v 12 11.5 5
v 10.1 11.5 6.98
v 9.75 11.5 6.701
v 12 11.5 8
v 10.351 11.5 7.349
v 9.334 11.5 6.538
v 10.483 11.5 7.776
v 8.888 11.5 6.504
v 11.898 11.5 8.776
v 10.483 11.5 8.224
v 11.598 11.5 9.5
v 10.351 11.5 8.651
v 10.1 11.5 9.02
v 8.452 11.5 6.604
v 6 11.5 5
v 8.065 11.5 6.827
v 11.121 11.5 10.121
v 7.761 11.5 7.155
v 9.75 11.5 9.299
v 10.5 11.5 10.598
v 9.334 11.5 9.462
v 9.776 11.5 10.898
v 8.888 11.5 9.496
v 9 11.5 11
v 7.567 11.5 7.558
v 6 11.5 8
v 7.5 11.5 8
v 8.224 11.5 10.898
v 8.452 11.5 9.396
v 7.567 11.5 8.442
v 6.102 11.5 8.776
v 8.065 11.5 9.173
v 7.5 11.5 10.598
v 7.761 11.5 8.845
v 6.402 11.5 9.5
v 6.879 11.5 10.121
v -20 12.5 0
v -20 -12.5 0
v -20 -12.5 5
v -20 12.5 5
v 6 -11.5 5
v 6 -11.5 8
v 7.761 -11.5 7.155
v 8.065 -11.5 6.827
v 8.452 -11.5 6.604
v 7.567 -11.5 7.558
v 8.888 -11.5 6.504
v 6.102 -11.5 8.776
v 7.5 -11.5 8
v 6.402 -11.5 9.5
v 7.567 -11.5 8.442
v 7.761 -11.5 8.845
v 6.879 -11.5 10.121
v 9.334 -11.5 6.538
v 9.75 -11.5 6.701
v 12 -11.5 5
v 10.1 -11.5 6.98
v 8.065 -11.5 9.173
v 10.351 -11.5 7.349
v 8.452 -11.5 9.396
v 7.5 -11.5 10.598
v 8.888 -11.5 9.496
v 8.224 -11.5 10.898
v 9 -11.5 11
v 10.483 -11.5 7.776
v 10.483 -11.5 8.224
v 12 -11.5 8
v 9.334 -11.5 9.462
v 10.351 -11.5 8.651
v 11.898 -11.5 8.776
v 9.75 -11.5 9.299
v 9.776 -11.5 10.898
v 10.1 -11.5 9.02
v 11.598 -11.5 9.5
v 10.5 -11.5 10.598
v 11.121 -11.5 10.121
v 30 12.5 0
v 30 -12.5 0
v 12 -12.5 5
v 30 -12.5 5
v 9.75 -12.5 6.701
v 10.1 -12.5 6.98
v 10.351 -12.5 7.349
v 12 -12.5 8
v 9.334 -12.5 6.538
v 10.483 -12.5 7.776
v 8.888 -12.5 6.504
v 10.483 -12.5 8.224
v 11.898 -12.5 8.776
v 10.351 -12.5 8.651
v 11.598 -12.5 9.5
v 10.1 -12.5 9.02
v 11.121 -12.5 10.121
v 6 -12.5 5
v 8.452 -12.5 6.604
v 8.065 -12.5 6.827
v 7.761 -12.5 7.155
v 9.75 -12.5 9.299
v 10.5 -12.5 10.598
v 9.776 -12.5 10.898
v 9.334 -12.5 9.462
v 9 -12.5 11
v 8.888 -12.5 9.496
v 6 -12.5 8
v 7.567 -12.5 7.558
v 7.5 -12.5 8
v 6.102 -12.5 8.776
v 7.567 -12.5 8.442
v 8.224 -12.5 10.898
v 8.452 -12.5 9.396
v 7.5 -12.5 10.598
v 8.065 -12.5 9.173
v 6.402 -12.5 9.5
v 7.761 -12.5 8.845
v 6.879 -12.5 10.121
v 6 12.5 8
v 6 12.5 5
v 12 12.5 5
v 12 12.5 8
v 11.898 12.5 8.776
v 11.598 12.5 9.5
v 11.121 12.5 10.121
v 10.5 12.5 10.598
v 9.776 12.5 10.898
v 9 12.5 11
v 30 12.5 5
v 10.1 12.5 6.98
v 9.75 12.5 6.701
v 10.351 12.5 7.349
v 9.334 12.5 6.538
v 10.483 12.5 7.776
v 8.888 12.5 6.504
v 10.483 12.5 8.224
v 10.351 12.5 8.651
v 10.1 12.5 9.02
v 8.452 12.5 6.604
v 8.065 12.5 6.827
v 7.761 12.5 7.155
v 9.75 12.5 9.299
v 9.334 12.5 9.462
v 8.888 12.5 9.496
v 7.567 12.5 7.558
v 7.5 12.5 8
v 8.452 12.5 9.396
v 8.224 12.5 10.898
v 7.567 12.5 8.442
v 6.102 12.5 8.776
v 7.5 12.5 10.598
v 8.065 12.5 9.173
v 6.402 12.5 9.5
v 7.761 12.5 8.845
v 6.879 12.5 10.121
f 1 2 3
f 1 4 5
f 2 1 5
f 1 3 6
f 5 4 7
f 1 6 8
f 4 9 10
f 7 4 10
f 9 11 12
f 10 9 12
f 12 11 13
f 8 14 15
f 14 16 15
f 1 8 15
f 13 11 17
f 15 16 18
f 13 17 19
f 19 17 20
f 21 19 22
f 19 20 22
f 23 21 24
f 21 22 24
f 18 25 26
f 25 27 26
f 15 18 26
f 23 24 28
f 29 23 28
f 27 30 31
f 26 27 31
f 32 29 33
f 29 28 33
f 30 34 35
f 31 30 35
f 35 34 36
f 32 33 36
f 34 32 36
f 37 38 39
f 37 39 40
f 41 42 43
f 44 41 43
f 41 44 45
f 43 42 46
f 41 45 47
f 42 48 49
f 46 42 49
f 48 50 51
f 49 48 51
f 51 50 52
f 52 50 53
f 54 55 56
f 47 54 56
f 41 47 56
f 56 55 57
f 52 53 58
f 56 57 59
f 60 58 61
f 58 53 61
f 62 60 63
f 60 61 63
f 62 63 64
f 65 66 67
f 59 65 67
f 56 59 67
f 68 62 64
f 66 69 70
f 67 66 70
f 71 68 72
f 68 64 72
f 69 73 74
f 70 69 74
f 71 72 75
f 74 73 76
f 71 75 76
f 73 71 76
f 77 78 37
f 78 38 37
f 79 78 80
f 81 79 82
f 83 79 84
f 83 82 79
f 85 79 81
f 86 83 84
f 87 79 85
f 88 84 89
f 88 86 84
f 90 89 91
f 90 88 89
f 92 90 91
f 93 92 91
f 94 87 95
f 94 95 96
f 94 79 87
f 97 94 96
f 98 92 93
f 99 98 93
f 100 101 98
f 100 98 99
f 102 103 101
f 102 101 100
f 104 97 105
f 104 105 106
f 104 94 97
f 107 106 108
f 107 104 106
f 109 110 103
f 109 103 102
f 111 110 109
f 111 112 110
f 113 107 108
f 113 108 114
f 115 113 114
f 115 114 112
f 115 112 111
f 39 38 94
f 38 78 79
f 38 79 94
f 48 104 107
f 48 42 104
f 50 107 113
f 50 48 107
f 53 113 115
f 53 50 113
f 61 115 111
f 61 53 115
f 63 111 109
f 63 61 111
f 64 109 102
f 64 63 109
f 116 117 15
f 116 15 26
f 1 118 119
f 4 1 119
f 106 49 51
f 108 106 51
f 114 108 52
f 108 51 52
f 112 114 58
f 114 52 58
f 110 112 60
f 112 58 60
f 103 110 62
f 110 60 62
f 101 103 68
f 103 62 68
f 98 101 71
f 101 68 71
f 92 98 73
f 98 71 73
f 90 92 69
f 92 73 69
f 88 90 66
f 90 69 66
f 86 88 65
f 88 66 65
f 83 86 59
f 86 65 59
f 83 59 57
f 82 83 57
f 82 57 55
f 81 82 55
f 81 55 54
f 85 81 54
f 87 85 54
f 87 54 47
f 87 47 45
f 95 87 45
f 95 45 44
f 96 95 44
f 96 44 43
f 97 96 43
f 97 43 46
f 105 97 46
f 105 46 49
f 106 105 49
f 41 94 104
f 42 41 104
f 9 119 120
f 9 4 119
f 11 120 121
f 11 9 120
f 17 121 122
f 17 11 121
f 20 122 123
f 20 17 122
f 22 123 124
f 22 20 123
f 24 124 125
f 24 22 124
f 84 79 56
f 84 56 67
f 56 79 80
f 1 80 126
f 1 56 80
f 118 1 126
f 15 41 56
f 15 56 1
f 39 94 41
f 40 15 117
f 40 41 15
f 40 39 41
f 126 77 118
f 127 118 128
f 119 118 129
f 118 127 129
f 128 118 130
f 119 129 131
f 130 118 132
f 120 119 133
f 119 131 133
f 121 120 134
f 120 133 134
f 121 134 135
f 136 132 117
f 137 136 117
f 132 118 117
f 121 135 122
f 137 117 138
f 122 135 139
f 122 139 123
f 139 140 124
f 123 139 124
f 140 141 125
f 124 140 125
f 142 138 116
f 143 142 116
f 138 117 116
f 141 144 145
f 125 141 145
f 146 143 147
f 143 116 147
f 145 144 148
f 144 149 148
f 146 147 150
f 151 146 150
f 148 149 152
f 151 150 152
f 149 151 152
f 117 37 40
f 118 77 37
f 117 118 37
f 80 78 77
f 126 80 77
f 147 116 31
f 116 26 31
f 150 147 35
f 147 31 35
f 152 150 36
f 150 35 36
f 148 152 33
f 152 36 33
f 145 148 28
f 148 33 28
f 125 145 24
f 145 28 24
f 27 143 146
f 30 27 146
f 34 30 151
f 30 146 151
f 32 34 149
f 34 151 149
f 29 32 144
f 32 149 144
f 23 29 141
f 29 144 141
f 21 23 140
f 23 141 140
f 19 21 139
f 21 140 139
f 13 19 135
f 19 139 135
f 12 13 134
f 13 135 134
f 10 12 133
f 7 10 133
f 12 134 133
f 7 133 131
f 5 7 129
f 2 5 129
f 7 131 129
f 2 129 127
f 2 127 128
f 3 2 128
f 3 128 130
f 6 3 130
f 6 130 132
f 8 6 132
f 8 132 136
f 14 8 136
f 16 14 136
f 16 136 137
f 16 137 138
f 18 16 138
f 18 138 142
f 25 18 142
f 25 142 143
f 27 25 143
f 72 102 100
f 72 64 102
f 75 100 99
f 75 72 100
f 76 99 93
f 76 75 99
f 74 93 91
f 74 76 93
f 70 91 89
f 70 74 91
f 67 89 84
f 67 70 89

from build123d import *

# Parameters (mm, degrees)
F0_W      = 40
F0_H      = 25
F1_DEPTH  = 5
F4_W      = 6
F4_H      = 6
F5_DEPTH  = 1
F3_W      = 6
F3_H      = 6
F6_DEPTH  = 1
F7_R      = 2.99999
F8_R      = 1.5
F9_DEPTH  = 30
F10_DEPTH = 10


# Not quite as in the source:
# - a fillet or chamfer is up to 0.001 mm smaller than in the source, because OpenCascade refuses the exact size


with BuildPart() as f1:
    # F0 (on Top) → F1 (new body)
    with BuildSketch(Plane.XY):
        Rectangle(F0_W, F0_H)
    extrude(amount=F1_DEPTH)

    # F4 (on face) → F5 (join)
    with BuildSketch(Plane.XZ.offset(12.5)):
        with Locations((9, 8)):
            Rectangle(F4_W, F4_H)
    extrude(amount=-F5_DEPTH)

    # F3 (on face) → F6 (join)
    with BuildSketch(Plane(origin=(0, 12.5, 0), x_dir=(-1, 0, 0), z_dir=(0, 1, 0))):
        with Locations((-9, 8)):
            Rectangle(F3_W, F3_H)
    extrude(amount=-F6_DEPTH)

    # F7 (radius 3 in the source; OpenCascade refuses exactly that, so slightly less here)
    f7_edges = [f1.edges().sort_by_distance(p)[0] for p in [
        (6, 12, 11),
        (12, 12, 11),
        (6, -12, 11),
        (12, -12, 11),
    ]]
    fillet(f7_edges, radius=F7_R)

    # F8 (on face) → F9 (cut)
    with BuildSketch(Plane(origin=(0, 12.5, 0), x_dir=(-1, 0, 0), z_dir=(0, 1, 0))):
        with Locations((-9, 8)):
            Circle(F8_R)
    extrude(amount=-F9_DEPTH, mode=Mode.SUBTRACT)

    # F10 (add): a face of the model
    f10_faces = [f1.faces().sort_by_distance(p)[0] for p in [
        (20, 0, 2.5),
    ]]
    extrude(f10_faces, amount=F10_DEPTH)


solid = f1.part
